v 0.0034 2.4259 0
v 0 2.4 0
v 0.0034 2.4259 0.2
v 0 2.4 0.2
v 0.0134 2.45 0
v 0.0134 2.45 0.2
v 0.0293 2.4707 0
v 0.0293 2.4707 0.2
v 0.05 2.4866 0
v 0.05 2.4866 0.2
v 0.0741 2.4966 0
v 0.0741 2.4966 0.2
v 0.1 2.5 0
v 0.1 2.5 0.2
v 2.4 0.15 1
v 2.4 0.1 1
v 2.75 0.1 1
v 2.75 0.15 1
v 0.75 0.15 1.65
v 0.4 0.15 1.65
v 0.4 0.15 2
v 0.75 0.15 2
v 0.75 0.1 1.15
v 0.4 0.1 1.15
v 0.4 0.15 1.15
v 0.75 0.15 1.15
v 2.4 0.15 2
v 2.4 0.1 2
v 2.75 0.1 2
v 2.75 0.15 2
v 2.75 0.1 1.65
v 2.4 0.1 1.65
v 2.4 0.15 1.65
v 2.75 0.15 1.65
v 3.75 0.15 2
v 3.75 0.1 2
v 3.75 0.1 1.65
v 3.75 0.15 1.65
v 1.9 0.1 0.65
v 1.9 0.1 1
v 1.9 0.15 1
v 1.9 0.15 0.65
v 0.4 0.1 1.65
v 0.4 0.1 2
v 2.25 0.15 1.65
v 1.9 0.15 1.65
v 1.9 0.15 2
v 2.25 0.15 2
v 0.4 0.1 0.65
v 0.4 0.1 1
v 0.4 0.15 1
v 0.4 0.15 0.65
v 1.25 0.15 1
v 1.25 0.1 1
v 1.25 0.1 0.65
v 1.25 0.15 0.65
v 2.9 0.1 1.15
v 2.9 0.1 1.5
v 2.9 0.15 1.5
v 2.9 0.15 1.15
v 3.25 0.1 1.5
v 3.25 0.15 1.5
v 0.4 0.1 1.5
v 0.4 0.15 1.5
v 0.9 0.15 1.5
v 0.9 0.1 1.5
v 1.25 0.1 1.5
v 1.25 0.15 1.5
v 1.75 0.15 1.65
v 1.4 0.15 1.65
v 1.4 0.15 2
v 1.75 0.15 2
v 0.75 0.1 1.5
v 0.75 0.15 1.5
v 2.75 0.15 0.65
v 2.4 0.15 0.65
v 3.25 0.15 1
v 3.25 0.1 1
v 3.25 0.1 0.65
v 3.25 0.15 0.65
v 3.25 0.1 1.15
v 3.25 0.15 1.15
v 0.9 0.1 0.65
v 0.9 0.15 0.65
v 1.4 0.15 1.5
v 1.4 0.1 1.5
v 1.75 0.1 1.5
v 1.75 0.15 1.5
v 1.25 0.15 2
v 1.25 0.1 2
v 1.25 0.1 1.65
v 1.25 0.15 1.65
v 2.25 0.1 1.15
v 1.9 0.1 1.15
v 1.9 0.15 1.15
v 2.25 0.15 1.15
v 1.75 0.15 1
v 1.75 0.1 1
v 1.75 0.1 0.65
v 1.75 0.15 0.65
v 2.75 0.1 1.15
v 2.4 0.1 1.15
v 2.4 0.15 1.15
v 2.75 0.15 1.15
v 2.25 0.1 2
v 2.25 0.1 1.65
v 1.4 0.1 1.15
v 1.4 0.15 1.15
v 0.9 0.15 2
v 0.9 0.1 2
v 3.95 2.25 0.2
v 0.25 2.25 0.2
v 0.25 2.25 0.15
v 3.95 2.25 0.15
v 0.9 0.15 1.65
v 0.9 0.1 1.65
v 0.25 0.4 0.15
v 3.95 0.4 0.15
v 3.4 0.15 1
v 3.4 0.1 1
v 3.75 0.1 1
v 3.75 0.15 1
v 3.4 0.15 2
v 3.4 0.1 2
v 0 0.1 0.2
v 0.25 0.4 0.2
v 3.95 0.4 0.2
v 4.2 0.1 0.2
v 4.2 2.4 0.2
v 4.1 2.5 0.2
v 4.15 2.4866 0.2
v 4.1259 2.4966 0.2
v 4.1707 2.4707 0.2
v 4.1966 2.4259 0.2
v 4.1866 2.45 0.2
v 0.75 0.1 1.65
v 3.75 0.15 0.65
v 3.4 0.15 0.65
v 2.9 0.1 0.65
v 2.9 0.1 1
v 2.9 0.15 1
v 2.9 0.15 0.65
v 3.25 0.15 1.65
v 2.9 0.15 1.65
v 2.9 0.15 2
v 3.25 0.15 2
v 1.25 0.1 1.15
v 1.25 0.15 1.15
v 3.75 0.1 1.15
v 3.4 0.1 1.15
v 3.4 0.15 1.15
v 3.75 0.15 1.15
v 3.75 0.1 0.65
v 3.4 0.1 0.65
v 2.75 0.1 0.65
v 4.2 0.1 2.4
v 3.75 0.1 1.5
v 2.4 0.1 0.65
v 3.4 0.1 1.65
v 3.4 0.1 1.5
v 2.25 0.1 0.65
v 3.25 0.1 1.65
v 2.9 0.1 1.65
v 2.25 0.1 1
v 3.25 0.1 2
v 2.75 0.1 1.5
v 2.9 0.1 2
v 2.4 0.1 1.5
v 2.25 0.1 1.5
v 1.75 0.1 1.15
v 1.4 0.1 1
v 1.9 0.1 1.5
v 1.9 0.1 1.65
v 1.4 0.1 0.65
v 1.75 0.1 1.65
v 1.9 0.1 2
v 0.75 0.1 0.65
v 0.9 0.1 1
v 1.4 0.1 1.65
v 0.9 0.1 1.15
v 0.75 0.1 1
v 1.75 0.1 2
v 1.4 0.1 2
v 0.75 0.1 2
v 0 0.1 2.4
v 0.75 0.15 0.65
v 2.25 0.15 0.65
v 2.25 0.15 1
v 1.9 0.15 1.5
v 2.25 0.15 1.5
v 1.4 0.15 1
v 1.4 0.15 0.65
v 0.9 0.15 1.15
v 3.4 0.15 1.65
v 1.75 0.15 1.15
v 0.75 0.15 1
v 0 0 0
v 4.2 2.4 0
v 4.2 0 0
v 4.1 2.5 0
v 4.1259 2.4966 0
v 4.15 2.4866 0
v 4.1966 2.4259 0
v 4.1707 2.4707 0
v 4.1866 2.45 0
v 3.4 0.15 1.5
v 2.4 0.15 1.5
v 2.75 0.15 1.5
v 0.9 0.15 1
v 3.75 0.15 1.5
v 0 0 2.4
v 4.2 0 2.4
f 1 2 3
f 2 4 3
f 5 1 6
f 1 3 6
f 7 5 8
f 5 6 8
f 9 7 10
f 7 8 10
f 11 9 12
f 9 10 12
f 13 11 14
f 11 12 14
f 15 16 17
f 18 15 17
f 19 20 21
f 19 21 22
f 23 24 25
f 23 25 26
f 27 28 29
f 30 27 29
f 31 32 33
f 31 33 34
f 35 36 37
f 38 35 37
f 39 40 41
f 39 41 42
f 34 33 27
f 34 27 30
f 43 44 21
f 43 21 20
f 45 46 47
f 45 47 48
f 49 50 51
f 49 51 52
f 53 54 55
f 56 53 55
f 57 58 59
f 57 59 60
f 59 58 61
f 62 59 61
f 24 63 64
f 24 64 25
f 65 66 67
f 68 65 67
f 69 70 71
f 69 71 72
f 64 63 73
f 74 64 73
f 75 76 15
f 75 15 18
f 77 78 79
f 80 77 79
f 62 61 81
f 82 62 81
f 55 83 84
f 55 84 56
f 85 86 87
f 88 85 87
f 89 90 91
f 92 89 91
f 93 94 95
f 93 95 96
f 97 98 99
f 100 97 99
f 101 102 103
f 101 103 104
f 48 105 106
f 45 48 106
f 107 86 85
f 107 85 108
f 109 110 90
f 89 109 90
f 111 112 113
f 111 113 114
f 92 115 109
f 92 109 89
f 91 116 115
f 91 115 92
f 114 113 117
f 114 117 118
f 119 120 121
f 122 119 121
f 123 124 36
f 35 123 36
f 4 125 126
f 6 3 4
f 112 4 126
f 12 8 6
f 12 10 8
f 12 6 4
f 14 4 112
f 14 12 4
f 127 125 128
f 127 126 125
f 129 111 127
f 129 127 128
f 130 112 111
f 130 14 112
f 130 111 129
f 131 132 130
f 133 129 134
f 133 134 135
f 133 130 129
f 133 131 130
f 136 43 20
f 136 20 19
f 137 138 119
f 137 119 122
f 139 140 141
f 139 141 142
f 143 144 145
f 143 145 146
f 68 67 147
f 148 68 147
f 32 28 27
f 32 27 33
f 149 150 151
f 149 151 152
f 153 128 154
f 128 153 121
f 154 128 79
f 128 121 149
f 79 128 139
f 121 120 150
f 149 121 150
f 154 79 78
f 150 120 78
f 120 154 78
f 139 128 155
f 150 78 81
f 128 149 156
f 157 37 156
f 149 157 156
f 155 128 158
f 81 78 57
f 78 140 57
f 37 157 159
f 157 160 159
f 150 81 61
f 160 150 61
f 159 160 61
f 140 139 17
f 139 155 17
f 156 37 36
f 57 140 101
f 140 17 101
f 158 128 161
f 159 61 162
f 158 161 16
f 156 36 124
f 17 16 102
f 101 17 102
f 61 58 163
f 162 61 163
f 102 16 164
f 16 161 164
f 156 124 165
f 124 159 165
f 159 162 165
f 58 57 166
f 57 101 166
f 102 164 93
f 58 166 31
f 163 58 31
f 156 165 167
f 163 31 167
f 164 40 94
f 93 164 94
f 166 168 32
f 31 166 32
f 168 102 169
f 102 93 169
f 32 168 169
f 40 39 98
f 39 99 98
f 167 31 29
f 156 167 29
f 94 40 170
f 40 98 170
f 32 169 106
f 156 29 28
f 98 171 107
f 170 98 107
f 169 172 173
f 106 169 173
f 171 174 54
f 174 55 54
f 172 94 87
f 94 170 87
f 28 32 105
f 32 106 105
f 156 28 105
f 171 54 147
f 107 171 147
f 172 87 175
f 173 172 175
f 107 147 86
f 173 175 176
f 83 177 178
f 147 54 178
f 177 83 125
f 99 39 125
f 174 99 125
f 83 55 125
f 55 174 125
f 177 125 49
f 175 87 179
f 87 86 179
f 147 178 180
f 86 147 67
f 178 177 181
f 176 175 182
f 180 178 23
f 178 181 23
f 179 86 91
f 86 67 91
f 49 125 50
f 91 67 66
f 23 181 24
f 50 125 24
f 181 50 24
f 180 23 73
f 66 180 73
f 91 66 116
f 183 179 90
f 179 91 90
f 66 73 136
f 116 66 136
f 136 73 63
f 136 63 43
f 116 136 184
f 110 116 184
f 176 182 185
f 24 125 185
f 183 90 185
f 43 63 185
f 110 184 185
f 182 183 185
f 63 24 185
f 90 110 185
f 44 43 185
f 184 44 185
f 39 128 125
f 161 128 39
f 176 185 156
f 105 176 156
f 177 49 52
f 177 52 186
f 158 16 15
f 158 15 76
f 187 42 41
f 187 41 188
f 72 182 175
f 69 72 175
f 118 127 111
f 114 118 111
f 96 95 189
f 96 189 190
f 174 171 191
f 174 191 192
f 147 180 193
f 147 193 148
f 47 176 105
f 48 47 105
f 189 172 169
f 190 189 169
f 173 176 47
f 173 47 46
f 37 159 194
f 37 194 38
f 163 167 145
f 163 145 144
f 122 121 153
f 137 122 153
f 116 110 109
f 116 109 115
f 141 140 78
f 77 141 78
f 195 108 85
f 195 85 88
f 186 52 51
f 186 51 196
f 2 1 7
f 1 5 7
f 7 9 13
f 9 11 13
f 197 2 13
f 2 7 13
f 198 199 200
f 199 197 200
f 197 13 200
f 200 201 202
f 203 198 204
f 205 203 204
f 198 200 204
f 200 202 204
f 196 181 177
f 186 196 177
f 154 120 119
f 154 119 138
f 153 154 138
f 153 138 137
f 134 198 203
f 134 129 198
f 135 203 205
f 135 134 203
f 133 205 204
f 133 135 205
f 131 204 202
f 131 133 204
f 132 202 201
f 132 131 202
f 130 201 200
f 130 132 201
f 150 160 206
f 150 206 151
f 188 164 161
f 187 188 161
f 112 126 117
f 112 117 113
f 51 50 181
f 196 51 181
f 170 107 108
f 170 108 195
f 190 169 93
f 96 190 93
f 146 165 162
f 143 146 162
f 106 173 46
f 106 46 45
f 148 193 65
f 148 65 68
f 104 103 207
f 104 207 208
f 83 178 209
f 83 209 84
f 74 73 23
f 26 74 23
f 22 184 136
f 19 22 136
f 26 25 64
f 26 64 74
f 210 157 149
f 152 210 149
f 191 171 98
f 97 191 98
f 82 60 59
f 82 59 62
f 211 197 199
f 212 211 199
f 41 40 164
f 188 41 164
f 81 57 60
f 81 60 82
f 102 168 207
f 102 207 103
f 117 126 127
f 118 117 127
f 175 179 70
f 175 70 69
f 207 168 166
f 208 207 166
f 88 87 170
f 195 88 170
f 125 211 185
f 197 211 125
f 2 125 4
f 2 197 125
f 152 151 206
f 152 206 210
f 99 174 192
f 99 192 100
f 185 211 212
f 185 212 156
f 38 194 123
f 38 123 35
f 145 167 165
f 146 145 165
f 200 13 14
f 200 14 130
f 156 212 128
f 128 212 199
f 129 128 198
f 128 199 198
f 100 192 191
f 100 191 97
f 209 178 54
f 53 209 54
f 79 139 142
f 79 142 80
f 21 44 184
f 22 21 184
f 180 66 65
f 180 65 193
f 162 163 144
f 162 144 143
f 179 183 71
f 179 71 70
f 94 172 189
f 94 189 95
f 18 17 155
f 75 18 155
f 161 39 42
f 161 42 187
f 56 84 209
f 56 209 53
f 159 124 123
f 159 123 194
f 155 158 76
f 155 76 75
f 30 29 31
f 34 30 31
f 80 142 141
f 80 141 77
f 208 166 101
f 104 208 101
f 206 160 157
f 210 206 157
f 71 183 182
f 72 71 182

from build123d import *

# Parameters (mm, degrees)
SKETCH1_W           = 4.2
SKETCH1_H           = 2.5
BOSS_EXTRUDE1_DEPTH = 0.2
SKETCH2_W           = 3.7
SKETCH2_H           = 1.85
CUT_EXTRUDE1_DEPTH  = 0.05
SKETCH3_W           = 2.4
SKETCH3_H           = 0.1
BOSS_EXTRUDE3_DEPTH = 4.2
FILLET3_R           = 0.1
SKETCH4_W           = 0.35
SKETCH4_H           = 0.35
BOSS_EXTRUDE4_DEPTH = 0.05


with BuildPart() as part:
    # Sketch1 → Boss-Extrude1 (new body)
    with BuildSketch(Plane.XY):
        with Locations((2.1, 1.25)):
            Rectangle(SKETCH1_W, SKETCH1_H)
    extrude(amount=BOSS_EXTRUDE1_DEPTH)

    # Sketch2 → Cut-Extrude1 (cut)
    with BuildSketch(Plane.XY.offset(0.2)):
        with Locations((2.1, 1.325)):
            Rectangle(SKETCH2_W, SKETCH2_H)
    extrude(amount=-CUT_EXTRUDE1_DEPTH, mode=Mode.SUBTRACT)

    # Sketch3 → Boss-Extrude3 (add)
    with BuildSketch(Plane.ZY):
        with Locations((1.2, 0.05)):
            Rectangle(SKETCH3_W, SKETCH3_H)
    extrude(amount=-BOSS_EXTRUDE3_DEPTH)

    # Fillet3
    fillet3_edges = [part.edges().sort_by_distance(p)[0] for p in [
        (0, 2.5, 0.1),
        (4.2, 2.5, 0.1),
    ]]
    fillet(fillet3_edges, radius=FILLET3_R)

    # Sketch4 → Boss-Extrude4 (add)
    with BuildSketch(Plane(origin=(0, 0.1, 0), x_dir=(1, 0, 0), z_dir=(0, 1, 0))):
        with Locations((0.575, -1.825)):
            Rectangle(SKETCH4_W, SKETCH4_H)
        with Locations((1.075, -1.825)):
            Rectangle(SKETCH4_W, SKETCH4_H)
        with Locations((1.575, -1.825)):
            Rectangle(SKETCH4_W, SKETCH4_H)
        with Locations((2.075, -1.825)):
            Rectangle(SKETCH4_W, SKETCH4_H)
        with Locations((2.575, -1.825)):
            Rectangle(SKETCH4_W, SKETCH4_H)
        with Locations((3.075, -1.825)):
            Rectangle(SKETCH4_W, SKETCH4_H)
        with Locations((3.575, -1.825)):
            Rectangle(SKETCH4_W, SKETCH4_H)
        with Locations((1.075, -1.325)):
            Rectangle(SKETCH4_W, SKETCH4_H)
        with Locations((1.575, -1.325)):
            Rectangle(SKETCH4_W, SKETCH4_H)
        with Locations((2.075, -1.325)):
            Rectangle(SKETCH4_W, SKETCH4_H)
        with Locations((2.575, -1.325)):
            Rectangle(SKETCH4_W, SKETCH4_H)
        with Locations((3.075, -1.325)):
            Rectangle(SKETCH4_W, SKETCH4_H)
        with Locations((3.575, -1.325)):
            Rectangle(SKETCH4_W, SKETCH4_H)
        with Locations((1.075, -0.825)):
            Rectangle(SKETCH4_W, SKETCH4_H)
        with Locations((1.575, -0.825)):
            Rectangle(SKETCH4_W, SKETCH4_H)
        with Locations((2.075, -0.825)):
            Rectangle(SKETCH4_W, SKETCH4_H)
        with Locations((2.575, -0.825)):
            Rectangle(SKETCH4_W, SKETCH4_H)
        with Locations((3.075, -0.825)):
            Rectangle(SKETCH4_W, SKETCH4_H)
        with Locations((3.575, -0.825)):
            Rectangle(SKETCH4_W, SKETCH4_H)
        with Locations((0.575, -1.325)):
            Rectangle(SKETCH4_W, SKETCH4_H)
        with Locations((0.575, -0.825)):
            Rectangle(SKETCH4_W, SKETCH4_H)
    extrude(amount=BOSS_EXTRUDE4_DEPTH)


solid = part.part
